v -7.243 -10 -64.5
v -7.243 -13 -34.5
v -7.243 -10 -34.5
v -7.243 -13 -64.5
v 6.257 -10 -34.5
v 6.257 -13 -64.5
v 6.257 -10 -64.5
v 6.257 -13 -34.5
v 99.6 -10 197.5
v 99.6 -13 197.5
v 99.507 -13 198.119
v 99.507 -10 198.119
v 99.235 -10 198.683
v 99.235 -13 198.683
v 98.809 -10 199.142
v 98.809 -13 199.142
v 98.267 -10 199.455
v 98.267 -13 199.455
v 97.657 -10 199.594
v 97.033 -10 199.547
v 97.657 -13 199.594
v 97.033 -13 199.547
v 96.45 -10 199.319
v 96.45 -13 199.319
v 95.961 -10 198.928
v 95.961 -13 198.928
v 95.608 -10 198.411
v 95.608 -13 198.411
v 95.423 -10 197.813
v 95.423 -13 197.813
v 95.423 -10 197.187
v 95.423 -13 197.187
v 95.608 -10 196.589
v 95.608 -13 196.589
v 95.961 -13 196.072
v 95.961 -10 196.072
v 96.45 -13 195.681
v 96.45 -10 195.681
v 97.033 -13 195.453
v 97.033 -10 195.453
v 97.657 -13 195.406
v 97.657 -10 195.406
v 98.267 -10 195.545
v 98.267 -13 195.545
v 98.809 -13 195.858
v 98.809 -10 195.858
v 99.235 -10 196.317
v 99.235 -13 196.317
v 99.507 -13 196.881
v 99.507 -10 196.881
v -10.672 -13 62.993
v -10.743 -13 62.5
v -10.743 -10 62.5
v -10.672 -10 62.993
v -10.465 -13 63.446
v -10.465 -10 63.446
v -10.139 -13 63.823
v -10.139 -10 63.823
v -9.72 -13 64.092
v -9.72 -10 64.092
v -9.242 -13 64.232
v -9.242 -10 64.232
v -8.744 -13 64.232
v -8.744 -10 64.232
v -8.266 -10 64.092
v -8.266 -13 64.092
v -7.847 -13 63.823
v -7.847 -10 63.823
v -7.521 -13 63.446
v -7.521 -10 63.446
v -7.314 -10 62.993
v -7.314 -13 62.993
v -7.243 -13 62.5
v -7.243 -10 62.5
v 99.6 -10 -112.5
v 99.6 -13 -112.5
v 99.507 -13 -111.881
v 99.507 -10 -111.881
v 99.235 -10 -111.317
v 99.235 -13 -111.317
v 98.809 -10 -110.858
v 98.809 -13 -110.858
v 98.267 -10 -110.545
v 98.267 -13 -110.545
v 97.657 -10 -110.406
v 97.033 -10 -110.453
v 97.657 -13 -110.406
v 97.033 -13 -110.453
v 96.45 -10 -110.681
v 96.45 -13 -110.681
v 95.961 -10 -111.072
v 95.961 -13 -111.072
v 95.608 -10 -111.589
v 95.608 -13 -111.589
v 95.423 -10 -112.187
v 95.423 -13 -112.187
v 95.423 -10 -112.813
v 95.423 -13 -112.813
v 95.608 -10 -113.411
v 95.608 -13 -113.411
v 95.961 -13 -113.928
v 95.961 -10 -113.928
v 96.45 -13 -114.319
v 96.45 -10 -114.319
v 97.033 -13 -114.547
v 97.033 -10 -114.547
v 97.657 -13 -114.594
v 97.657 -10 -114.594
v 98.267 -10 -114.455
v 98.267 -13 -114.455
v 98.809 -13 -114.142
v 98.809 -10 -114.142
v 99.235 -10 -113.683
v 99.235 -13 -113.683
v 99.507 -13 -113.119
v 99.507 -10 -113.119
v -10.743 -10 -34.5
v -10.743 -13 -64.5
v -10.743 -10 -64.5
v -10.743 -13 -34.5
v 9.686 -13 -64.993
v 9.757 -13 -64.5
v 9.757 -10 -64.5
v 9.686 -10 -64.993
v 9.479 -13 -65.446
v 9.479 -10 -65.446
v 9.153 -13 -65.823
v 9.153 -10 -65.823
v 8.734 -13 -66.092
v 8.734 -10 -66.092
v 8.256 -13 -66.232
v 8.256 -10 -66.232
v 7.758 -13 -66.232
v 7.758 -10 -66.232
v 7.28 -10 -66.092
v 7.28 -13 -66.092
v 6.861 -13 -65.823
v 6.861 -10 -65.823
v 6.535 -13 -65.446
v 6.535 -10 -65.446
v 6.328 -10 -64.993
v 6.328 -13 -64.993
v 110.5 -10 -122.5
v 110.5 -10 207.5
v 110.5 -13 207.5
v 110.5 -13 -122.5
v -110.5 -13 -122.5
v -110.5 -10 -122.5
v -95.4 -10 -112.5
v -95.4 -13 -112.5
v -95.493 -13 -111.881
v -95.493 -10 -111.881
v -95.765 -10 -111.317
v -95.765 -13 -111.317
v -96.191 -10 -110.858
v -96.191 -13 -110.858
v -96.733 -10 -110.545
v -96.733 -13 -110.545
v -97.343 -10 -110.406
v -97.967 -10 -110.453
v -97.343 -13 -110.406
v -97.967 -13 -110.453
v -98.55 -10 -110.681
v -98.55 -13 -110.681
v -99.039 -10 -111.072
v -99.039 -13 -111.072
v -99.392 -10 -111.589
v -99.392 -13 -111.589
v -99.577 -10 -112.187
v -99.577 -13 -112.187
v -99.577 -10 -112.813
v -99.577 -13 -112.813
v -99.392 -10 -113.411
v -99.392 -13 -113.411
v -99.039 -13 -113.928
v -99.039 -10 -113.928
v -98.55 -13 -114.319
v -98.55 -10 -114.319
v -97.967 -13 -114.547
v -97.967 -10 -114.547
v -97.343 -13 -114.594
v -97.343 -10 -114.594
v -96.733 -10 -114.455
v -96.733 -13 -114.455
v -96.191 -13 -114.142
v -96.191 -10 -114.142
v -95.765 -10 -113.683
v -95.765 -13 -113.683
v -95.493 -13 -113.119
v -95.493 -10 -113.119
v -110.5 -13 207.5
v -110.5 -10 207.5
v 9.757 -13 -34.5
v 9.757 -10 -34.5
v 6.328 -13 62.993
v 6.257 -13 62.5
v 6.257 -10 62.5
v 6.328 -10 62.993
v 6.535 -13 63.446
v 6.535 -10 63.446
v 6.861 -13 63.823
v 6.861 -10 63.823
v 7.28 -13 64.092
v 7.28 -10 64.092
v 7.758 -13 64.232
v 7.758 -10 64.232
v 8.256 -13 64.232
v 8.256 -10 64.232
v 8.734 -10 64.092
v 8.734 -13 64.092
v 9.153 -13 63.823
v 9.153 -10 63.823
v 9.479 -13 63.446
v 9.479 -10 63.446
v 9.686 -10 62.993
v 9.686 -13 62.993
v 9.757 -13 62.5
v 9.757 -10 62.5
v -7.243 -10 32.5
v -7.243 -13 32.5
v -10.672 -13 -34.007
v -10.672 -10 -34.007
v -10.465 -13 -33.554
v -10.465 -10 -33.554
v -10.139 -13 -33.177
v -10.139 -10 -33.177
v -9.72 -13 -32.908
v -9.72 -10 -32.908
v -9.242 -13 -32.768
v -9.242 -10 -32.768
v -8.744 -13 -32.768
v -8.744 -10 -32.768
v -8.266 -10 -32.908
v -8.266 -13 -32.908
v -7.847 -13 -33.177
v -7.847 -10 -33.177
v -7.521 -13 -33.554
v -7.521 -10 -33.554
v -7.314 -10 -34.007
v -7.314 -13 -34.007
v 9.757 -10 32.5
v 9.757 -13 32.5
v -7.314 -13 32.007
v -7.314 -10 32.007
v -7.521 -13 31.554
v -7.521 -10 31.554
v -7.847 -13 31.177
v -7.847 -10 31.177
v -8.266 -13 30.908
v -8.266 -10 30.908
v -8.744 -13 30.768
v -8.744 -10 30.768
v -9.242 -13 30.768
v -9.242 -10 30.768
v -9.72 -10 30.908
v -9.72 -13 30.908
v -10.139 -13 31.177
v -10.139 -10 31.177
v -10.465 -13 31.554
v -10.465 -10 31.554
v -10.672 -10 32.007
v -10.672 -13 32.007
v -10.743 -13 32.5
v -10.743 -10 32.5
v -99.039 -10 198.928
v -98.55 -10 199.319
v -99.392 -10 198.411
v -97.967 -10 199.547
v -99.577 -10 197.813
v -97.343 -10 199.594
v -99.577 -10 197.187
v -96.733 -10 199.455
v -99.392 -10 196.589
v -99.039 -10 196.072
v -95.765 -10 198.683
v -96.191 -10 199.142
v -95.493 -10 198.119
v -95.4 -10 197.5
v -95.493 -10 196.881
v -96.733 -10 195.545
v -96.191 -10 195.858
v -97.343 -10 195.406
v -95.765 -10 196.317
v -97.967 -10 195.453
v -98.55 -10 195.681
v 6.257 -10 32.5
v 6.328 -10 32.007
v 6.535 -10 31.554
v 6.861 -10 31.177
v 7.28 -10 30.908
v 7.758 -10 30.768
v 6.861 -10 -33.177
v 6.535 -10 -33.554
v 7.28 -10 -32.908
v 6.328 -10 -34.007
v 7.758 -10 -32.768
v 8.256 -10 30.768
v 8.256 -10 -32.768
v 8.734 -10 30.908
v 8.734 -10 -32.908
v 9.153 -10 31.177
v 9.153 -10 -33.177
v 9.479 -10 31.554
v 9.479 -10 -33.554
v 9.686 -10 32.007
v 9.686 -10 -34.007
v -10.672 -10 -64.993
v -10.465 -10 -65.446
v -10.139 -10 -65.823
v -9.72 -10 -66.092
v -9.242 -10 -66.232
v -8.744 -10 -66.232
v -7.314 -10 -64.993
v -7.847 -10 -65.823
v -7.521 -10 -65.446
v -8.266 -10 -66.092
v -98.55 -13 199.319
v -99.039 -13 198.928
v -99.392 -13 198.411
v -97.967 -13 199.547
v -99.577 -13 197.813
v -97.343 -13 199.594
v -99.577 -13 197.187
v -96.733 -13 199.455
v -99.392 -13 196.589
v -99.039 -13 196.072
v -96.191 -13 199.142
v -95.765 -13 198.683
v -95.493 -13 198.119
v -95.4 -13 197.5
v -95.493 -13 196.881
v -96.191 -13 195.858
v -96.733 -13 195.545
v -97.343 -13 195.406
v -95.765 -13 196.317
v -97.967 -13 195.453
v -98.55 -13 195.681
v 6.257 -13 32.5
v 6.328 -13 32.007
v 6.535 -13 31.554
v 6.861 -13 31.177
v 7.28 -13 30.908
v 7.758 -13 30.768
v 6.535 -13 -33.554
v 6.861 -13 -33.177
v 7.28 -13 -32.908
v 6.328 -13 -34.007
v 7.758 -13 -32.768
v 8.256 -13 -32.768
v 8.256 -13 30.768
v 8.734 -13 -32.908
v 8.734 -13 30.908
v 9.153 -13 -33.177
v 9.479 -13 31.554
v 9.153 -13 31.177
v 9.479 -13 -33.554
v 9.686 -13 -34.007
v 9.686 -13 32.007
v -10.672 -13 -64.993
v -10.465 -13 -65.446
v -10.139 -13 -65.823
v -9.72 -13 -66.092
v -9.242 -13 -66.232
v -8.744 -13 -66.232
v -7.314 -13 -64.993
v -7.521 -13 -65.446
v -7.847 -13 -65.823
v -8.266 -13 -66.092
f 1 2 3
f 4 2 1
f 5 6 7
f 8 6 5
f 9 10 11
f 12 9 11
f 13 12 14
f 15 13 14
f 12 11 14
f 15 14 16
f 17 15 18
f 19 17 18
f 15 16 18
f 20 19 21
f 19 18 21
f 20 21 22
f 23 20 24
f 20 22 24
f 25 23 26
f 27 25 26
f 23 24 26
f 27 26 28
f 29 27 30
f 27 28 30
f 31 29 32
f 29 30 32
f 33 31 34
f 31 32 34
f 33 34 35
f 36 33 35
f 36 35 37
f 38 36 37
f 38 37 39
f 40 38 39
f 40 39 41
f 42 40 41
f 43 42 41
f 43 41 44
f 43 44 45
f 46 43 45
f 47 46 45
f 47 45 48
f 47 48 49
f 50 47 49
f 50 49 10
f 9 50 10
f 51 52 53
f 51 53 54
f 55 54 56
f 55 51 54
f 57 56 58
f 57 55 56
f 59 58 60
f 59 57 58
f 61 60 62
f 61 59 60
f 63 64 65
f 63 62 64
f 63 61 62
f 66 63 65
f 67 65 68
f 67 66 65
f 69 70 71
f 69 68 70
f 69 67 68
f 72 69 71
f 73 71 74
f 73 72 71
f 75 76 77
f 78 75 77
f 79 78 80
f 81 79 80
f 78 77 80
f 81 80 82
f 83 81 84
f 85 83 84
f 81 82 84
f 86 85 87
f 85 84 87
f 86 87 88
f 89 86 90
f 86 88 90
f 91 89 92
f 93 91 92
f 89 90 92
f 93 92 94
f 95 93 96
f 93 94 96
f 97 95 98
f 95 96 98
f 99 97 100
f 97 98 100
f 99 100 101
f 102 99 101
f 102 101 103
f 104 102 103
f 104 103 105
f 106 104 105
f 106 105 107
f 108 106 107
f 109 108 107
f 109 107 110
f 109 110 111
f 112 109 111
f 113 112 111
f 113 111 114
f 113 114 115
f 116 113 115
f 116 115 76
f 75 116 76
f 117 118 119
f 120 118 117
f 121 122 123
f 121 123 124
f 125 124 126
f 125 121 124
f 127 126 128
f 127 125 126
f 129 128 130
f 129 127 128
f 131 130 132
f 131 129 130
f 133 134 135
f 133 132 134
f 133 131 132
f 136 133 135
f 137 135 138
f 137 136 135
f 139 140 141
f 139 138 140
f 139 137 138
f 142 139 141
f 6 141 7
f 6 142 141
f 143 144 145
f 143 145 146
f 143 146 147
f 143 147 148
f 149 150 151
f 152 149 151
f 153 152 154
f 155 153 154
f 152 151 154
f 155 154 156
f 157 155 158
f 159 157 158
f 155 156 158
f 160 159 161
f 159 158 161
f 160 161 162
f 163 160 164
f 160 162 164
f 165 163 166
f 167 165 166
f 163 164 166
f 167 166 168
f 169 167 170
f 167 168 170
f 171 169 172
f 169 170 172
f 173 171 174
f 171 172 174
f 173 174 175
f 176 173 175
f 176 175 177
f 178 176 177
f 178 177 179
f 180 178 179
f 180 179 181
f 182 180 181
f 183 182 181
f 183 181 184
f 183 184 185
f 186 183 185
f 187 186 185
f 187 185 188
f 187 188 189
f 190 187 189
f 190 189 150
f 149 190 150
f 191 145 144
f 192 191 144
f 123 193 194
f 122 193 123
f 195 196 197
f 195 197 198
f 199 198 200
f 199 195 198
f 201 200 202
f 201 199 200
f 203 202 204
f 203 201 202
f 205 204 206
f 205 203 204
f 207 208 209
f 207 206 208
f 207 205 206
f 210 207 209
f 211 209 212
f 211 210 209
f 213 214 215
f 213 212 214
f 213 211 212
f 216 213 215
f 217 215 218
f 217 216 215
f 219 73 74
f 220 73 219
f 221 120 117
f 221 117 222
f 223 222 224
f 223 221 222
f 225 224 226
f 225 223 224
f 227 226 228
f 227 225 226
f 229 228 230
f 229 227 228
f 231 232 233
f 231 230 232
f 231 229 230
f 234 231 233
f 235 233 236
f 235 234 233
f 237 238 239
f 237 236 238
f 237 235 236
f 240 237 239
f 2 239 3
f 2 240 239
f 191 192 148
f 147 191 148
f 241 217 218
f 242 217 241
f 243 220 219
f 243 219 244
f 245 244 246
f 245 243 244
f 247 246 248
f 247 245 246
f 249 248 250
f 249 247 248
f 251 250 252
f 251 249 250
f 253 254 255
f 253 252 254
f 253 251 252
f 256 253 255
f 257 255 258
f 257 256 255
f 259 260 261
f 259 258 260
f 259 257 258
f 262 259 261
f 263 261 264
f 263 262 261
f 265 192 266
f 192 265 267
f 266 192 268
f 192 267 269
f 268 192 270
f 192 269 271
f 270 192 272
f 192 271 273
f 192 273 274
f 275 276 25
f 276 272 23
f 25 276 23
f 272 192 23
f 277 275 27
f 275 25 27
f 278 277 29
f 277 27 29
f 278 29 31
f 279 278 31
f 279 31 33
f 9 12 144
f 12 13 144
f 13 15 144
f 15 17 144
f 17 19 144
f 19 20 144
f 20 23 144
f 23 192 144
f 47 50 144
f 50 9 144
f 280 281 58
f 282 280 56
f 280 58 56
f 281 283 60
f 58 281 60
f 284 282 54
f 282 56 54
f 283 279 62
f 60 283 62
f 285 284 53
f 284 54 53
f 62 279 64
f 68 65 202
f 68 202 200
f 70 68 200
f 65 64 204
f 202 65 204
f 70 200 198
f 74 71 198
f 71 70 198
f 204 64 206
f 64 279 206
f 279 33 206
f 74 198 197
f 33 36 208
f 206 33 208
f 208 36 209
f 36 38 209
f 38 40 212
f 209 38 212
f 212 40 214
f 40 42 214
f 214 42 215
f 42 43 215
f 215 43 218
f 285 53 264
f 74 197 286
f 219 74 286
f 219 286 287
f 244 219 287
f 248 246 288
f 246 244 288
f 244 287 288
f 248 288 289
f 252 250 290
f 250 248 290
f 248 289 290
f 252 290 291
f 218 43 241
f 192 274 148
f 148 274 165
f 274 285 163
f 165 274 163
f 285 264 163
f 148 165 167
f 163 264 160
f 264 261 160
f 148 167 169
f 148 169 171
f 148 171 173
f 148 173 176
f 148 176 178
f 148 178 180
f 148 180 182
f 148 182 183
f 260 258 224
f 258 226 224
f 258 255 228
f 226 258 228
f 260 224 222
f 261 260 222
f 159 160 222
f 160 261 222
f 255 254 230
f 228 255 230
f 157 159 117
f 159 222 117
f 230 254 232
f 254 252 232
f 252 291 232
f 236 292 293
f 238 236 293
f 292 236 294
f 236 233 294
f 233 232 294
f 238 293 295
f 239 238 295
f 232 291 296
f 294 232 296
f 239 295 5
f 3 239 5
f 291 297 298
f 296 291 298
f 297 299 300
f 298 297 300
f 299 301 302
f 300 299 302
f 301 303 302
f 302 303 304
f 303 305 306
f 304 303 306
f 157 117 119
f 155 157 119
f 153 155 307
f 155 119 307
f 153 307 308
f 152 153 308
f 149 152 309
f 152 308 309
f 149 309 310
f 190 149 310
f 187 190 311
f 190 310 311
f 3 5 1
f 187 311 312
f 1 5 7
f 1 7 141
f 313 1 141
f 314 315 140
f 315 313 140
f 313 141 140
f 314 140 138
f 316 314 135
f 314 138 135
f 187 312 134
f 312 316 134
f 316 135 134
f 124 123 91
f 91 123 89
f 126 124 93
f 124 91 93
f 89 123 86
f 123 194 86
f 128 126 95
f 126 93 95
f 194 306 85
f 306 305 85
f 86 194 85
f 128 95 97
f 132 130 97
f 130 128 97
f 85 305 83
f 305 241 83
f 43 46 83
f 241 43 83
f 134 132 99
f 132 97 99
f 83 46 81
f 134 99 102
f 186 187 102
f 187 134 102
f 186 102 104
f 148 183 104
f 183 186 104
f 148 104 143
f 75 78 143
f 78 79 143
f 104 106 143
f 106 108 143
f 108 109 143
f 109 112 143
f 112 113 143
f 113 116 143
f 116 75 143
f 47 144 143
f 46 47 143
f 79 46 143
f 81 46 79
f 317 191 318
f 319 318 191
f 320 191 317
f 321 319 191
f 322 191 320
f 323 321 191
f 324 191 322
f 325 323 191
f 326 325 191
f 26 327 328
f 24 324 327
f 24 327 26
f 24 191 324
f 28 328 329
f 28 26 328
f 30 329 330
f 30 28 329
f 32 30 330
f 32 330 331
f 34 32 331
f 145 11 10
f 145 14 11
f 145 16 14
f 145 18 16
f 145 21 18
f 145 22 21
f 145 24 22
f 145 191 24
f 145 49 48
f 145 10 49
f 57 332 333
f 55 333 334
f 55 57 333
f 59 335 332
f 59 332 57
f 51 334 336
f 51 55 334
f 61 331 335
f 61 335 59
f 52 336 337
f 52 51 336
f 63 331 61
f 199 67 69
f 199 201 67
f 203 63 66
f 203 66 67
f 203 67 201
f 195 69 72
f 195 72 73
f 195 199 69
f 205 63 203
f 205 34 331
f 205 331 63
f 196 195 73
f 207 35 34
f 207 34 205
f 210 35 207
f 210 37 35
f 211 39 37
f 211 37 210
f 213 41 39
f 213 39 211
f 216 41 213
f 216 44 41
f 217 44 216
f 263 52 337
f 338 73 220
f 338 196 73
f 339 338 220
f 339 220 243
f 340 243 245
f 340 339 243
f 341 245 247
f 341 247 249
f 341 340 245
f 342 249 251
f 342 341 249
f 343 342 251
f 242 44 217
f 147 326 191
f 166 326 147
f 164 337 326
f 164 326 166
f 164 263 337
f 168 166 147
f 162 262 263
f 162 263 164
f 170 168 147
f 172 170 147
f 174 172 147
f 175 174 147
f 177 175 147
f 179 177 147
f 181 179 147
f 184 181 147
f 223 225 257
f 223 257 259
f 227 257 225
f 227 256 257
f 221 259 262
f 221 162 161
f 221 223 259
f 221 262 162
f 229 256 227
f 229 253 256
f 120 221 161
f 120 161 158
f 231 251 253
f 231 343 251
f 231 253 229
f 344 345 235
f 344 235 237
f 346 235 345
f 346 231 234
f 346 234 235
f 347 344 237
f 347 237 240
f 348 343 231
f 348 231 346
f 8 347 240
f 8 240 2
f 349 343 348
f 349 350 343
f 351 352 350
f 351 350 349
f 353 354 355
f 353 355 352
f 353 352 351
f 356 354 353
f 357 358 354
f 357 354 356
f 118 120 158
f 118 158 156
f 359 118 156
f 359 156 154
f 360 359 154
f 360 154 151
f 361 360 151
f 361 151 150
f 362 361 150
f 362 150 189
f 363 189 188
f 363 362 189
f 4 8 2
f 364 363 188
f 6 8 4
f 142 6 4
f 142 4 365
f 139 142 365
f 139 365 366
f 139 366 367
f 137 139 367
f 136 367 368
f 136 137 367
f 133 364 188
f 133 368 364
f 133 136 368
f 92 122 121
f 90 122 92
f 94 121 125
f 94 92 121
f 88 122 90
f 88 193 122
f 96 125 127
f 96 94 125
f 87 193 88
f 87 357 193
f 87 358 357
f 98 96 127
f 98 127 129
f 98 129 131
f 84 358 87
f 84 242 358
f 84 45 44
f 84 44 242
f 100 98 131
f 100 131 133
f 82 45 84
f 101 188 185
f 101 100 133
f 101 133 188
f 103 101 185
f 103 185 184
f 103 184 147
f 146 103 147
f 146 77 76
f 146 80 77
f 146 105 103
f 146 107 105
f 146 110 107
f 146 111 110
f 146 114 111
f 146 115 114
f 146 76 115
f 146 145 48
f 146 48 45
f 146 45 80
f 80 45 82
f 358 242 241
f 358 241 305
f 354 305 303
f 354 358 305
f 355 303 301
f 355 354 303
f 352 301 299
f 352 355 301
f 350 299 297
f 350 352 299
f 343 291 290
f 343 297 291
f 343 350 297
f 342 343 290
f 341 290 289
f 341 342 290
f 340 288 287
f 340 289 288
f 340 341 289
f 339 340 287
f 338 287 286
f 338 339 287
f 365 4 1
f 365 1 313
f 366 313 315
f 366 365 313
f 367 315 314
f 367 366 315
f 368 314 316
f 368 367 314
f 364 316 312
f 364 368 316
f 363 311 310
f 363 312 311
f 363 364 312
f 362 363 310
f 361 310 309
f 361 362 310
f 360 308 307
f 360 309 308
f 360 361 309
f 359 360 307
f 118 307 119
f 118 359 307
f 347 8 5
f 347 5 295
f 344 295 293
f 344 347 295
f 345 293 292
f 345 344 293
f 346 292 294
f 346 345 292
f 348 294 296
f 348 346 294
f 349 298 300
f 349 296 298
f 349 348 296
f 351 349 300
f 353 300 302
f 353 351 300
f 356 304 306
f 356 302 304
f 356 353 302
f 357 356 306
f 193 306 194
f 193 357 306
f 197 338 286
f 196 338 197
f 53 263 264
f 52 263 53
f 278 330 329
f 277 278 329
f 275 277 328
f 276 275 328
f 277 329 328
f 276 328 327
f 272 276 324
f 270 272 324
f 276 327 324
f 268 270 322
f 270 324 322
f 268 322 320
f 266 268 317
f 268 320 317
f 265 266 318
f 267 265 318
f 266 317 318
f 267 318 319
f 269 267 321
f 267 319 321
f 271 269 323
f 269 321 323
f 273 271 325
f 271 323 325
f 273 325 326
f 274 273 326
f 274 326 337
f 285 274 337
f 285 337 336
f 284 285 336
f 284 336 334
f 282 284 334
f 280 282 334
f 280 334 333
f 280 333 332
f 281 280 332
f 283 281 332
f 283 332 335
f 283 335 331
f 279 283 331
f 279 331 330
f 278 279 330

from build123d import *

# Parameters (mm, degrees)
SKETCH1_W                = 330
SKETCH1_H                = 3
EXTRUDE_THIN1_DEPTH      = 110.5
EXTRUDE_THIN1_DEPTH_BACK = 110.5
CUT_EXTRUDE1_REACH       = 5
SKETCH2_R                = 2.1


with BuildPart() as part:
    # Sketch1 → Extrude-Thin1 (new body, two sides)
    with BuildSketch(Plane(origin=(0, 0, 0), x_dir=(0, 0, -1), z_dir=(1, 0, 0))) as extrude_thin1_sk:
        with Locations((-42.5, -11.5)):
            Rectangle(SKETCH1_W, SKETCH1_H)
    extrude(amount=EXTRUDE_THIN1_DEPTH)
    extrude(extrude_thin1_sk.sketch, amount=-EXTRUDE_THIN1_DEPTH_BACK)

    # Sketch2 → Cut-Extrude1 (cut, up to next)
    with BuildSketch(Plane.XZ.offset(13), mode=Mode.PRIVATE) as cut_extrude1_sk1:
        with Locations((97.5, -112.5)):
            Circle(SKETCH2_R)
    cut_extrude1_tool1 = extrude(cut_extrude1_sk1.sketch, amount=-CUT_EXTRUDE1_REACH, mode=Mode.PRIVATE) & part.part
    add(cut_extrude1_tool1.solids().sort_by_distance((97.5, -13, -112.5))[0], mode=Mode.SUBTRACT)
    # Sketch2 → Cut-Extrude1 (cut, up to next)
    with BuildSketch(Plane.XZ.offset(13), mode=Mode.PRIVATE) as cut_extrude1_sk2:
        with Locations((-97.5, -112.5)):
            Circle(SKETCH2_R)
    cut_extrude1_tool2 = extrude(cut_extrude1_sk2.sketch, amount=-CUT_EXTRUDE1_REACH, mode=Mode.PRIVATE) & part.part
    add(cut_extrude1_tool2.solids().sort_by_distance((-97.5, -13, -112.5))[0], mode=Mode.SUBTRACT)
    # Sketch2 → Cut-Extrude1 (cut, up to next)
    with BuildSketch(Plane.XZ.offset(13), mode=Mode.PRIVATE) as cut_extrude1_sk3:
        with Locations((97.5, 197.5)):
            Circle(SKETCH2_R)
    cut_extrude1_tool3 = extrude(cut_extrude1_sk3.sketch, amount=-CUT_EXTRUDE1_REACH, mode=Mode.PRIVATE) & part.part
    add(cut_extrude1_tool3.solids().sort_by_distance((97.5, -13, 197.5))[0], mode=Mode.SUBTRACT)
    # Sketch2 → Cut-Extrude1 (cut, up to next)
    with BuildSketch(Plane.XZ.offset(13), mode=Mode.PRIVATE) as cut_extrude1_sk4:
        with Locations((-97.5, 197.5)):
            Circle(SKETCH2_R)
    cut_extrude1_tool4 = extrude(cut_extrude1_sk4.sketch, amount=-CUT_EXTRUDE1_REACH, mode=Mode.PRIVATE) & part.part
    add(cut_extrude1_tool4.solids().sort_by_distance((-97.5, -13, 197.5))[0], mode=Mode.SUBTRACT)
    # Sketch2 → Cut-Extrude1 (cut, up to next)
    with BuildSketch(Plane.XZ.offset(13), mode=Mode.PRIVATE) as cut_extrude1_sk5:
        with BuildLine():
            Line((-7.243170513, -34.5), (-7.243170513, -64.5))
            ThreePointArc((-7.243170513, -64.5), (-8.993170513, -66.25), (-10.743170513, -64.5))
            Line((-10.743170513, -64.5), (-10.743170513, -34.5))
            ThreePointArc((-10.743170513, -34.5), (-8.993170513, -32.75), (-7.243170513, -34.5))
        make_face()
    cut_extrude1_tool5 = extrude(cut_extrude1_sk5.sketch, amount=-CUT_EXTRUDE1_REACH, mode=Mode.PRIVATE) & part.part
    add(cut_extrude1_tool5.solids().sort_by_distance((-8.993171, -13, -49.5))[0], mode=Mode.SUBTRACT)
    # Sketch2 → Cut-Extrude1 (cut, up to next)
    with BuildSketch(Plane.XZ.offset(13), mode=Mode.PRIVATE) as cut_extrude1_sk6:
        with BuildLine():
            Line((9.756829487, -34.5), (9.756829487, -64.5))
            ThreePointArc((9.756829487, -64.5), (8.006829487, -66.25), (6.256829487, -64.5))
            Line((6.256829487, -64.5), (6.256829487, -34.5))
            ThreePointArc((6.256829487, -34.5), (8.006829487, -32.75), (9.756829487, -34.5))
        make_face()
    cut_extrude1_tool6 = extrude(cut_extrude1_sk6.sketch, amount=-CUT_EXTRUDE1_REACH, mode=Mode.PRIVATE) & part.part
    add(cut_extrude1_tool6.solids().sort_by_distance((8.006829, -13, -49.5))[0], mode=Mode.SUBTRACT)
    # Sketch2 → Cut-Extrude1 (cut, up to next)
    with BuildSketch(Plane.XZ.offset(13), mode=Mode.PRIVATE) as cut_extrude1_sk7:
        with BuildLine():
            Line((9.756829487, 62.5), (9.756829487, 32.5))
            ThreePointArc((9.756829487, 32.5), (8.006829487, 30.75), (6.256829487, 32.5))
            Line((6.256829487, 32.5), (6.256829487, 62.5))
            ThreePointArc((6.256829487, 62.5), (8.006829487, 64.25), (9.756829487, 62.5))
        make_face()
    cut_extrude1_tool7 = extrude(cut_extrude1_sk7.sketch, amount=-CUT_EXTRUDE1_REACH, mode=Mode.PRIVATE) & part.part
    add(cut_extrude1_tool7.solids().sort_by_distance((8.006829, -13, 47.5))[0], mode=Mode.SUBTRACT)
    # Sketch2 → Cut-Extrude1 (cut, up to next)
    with BuildSketch(Plane.XZ.offset(13), mode=Mode.PRIVATE) as cut_extrude1_sk8:
        with BuildLine():
            Line((-7.243170513, 62.5), (-7.243170513, 32.5))
            ThreePointArc((-7.243170513, 32.5), (-8.993170513, 30.75), (-10.743170513, 32.5))
            Line((-10.743170513, 32.5), (-10.743170513, 62.5))
            ThreePointArc((-10.743170513, 62.5), (-8.993170513, 64.25), (-7.243170513, 62.5))
        make_face()
    cut_extrude1_tool8 = extrude(cut_extrude1_sk8.sketch, amount=-CUT_EXTRUDE1_REACH, mode=Mode.PRIVATE) & part.part
    add(cut_extrude1_tool8.solids().sort_by_distance((-8.993171, -13, 47.5))[0], mode=Mode.SUBTRACT)


solid = part.part
